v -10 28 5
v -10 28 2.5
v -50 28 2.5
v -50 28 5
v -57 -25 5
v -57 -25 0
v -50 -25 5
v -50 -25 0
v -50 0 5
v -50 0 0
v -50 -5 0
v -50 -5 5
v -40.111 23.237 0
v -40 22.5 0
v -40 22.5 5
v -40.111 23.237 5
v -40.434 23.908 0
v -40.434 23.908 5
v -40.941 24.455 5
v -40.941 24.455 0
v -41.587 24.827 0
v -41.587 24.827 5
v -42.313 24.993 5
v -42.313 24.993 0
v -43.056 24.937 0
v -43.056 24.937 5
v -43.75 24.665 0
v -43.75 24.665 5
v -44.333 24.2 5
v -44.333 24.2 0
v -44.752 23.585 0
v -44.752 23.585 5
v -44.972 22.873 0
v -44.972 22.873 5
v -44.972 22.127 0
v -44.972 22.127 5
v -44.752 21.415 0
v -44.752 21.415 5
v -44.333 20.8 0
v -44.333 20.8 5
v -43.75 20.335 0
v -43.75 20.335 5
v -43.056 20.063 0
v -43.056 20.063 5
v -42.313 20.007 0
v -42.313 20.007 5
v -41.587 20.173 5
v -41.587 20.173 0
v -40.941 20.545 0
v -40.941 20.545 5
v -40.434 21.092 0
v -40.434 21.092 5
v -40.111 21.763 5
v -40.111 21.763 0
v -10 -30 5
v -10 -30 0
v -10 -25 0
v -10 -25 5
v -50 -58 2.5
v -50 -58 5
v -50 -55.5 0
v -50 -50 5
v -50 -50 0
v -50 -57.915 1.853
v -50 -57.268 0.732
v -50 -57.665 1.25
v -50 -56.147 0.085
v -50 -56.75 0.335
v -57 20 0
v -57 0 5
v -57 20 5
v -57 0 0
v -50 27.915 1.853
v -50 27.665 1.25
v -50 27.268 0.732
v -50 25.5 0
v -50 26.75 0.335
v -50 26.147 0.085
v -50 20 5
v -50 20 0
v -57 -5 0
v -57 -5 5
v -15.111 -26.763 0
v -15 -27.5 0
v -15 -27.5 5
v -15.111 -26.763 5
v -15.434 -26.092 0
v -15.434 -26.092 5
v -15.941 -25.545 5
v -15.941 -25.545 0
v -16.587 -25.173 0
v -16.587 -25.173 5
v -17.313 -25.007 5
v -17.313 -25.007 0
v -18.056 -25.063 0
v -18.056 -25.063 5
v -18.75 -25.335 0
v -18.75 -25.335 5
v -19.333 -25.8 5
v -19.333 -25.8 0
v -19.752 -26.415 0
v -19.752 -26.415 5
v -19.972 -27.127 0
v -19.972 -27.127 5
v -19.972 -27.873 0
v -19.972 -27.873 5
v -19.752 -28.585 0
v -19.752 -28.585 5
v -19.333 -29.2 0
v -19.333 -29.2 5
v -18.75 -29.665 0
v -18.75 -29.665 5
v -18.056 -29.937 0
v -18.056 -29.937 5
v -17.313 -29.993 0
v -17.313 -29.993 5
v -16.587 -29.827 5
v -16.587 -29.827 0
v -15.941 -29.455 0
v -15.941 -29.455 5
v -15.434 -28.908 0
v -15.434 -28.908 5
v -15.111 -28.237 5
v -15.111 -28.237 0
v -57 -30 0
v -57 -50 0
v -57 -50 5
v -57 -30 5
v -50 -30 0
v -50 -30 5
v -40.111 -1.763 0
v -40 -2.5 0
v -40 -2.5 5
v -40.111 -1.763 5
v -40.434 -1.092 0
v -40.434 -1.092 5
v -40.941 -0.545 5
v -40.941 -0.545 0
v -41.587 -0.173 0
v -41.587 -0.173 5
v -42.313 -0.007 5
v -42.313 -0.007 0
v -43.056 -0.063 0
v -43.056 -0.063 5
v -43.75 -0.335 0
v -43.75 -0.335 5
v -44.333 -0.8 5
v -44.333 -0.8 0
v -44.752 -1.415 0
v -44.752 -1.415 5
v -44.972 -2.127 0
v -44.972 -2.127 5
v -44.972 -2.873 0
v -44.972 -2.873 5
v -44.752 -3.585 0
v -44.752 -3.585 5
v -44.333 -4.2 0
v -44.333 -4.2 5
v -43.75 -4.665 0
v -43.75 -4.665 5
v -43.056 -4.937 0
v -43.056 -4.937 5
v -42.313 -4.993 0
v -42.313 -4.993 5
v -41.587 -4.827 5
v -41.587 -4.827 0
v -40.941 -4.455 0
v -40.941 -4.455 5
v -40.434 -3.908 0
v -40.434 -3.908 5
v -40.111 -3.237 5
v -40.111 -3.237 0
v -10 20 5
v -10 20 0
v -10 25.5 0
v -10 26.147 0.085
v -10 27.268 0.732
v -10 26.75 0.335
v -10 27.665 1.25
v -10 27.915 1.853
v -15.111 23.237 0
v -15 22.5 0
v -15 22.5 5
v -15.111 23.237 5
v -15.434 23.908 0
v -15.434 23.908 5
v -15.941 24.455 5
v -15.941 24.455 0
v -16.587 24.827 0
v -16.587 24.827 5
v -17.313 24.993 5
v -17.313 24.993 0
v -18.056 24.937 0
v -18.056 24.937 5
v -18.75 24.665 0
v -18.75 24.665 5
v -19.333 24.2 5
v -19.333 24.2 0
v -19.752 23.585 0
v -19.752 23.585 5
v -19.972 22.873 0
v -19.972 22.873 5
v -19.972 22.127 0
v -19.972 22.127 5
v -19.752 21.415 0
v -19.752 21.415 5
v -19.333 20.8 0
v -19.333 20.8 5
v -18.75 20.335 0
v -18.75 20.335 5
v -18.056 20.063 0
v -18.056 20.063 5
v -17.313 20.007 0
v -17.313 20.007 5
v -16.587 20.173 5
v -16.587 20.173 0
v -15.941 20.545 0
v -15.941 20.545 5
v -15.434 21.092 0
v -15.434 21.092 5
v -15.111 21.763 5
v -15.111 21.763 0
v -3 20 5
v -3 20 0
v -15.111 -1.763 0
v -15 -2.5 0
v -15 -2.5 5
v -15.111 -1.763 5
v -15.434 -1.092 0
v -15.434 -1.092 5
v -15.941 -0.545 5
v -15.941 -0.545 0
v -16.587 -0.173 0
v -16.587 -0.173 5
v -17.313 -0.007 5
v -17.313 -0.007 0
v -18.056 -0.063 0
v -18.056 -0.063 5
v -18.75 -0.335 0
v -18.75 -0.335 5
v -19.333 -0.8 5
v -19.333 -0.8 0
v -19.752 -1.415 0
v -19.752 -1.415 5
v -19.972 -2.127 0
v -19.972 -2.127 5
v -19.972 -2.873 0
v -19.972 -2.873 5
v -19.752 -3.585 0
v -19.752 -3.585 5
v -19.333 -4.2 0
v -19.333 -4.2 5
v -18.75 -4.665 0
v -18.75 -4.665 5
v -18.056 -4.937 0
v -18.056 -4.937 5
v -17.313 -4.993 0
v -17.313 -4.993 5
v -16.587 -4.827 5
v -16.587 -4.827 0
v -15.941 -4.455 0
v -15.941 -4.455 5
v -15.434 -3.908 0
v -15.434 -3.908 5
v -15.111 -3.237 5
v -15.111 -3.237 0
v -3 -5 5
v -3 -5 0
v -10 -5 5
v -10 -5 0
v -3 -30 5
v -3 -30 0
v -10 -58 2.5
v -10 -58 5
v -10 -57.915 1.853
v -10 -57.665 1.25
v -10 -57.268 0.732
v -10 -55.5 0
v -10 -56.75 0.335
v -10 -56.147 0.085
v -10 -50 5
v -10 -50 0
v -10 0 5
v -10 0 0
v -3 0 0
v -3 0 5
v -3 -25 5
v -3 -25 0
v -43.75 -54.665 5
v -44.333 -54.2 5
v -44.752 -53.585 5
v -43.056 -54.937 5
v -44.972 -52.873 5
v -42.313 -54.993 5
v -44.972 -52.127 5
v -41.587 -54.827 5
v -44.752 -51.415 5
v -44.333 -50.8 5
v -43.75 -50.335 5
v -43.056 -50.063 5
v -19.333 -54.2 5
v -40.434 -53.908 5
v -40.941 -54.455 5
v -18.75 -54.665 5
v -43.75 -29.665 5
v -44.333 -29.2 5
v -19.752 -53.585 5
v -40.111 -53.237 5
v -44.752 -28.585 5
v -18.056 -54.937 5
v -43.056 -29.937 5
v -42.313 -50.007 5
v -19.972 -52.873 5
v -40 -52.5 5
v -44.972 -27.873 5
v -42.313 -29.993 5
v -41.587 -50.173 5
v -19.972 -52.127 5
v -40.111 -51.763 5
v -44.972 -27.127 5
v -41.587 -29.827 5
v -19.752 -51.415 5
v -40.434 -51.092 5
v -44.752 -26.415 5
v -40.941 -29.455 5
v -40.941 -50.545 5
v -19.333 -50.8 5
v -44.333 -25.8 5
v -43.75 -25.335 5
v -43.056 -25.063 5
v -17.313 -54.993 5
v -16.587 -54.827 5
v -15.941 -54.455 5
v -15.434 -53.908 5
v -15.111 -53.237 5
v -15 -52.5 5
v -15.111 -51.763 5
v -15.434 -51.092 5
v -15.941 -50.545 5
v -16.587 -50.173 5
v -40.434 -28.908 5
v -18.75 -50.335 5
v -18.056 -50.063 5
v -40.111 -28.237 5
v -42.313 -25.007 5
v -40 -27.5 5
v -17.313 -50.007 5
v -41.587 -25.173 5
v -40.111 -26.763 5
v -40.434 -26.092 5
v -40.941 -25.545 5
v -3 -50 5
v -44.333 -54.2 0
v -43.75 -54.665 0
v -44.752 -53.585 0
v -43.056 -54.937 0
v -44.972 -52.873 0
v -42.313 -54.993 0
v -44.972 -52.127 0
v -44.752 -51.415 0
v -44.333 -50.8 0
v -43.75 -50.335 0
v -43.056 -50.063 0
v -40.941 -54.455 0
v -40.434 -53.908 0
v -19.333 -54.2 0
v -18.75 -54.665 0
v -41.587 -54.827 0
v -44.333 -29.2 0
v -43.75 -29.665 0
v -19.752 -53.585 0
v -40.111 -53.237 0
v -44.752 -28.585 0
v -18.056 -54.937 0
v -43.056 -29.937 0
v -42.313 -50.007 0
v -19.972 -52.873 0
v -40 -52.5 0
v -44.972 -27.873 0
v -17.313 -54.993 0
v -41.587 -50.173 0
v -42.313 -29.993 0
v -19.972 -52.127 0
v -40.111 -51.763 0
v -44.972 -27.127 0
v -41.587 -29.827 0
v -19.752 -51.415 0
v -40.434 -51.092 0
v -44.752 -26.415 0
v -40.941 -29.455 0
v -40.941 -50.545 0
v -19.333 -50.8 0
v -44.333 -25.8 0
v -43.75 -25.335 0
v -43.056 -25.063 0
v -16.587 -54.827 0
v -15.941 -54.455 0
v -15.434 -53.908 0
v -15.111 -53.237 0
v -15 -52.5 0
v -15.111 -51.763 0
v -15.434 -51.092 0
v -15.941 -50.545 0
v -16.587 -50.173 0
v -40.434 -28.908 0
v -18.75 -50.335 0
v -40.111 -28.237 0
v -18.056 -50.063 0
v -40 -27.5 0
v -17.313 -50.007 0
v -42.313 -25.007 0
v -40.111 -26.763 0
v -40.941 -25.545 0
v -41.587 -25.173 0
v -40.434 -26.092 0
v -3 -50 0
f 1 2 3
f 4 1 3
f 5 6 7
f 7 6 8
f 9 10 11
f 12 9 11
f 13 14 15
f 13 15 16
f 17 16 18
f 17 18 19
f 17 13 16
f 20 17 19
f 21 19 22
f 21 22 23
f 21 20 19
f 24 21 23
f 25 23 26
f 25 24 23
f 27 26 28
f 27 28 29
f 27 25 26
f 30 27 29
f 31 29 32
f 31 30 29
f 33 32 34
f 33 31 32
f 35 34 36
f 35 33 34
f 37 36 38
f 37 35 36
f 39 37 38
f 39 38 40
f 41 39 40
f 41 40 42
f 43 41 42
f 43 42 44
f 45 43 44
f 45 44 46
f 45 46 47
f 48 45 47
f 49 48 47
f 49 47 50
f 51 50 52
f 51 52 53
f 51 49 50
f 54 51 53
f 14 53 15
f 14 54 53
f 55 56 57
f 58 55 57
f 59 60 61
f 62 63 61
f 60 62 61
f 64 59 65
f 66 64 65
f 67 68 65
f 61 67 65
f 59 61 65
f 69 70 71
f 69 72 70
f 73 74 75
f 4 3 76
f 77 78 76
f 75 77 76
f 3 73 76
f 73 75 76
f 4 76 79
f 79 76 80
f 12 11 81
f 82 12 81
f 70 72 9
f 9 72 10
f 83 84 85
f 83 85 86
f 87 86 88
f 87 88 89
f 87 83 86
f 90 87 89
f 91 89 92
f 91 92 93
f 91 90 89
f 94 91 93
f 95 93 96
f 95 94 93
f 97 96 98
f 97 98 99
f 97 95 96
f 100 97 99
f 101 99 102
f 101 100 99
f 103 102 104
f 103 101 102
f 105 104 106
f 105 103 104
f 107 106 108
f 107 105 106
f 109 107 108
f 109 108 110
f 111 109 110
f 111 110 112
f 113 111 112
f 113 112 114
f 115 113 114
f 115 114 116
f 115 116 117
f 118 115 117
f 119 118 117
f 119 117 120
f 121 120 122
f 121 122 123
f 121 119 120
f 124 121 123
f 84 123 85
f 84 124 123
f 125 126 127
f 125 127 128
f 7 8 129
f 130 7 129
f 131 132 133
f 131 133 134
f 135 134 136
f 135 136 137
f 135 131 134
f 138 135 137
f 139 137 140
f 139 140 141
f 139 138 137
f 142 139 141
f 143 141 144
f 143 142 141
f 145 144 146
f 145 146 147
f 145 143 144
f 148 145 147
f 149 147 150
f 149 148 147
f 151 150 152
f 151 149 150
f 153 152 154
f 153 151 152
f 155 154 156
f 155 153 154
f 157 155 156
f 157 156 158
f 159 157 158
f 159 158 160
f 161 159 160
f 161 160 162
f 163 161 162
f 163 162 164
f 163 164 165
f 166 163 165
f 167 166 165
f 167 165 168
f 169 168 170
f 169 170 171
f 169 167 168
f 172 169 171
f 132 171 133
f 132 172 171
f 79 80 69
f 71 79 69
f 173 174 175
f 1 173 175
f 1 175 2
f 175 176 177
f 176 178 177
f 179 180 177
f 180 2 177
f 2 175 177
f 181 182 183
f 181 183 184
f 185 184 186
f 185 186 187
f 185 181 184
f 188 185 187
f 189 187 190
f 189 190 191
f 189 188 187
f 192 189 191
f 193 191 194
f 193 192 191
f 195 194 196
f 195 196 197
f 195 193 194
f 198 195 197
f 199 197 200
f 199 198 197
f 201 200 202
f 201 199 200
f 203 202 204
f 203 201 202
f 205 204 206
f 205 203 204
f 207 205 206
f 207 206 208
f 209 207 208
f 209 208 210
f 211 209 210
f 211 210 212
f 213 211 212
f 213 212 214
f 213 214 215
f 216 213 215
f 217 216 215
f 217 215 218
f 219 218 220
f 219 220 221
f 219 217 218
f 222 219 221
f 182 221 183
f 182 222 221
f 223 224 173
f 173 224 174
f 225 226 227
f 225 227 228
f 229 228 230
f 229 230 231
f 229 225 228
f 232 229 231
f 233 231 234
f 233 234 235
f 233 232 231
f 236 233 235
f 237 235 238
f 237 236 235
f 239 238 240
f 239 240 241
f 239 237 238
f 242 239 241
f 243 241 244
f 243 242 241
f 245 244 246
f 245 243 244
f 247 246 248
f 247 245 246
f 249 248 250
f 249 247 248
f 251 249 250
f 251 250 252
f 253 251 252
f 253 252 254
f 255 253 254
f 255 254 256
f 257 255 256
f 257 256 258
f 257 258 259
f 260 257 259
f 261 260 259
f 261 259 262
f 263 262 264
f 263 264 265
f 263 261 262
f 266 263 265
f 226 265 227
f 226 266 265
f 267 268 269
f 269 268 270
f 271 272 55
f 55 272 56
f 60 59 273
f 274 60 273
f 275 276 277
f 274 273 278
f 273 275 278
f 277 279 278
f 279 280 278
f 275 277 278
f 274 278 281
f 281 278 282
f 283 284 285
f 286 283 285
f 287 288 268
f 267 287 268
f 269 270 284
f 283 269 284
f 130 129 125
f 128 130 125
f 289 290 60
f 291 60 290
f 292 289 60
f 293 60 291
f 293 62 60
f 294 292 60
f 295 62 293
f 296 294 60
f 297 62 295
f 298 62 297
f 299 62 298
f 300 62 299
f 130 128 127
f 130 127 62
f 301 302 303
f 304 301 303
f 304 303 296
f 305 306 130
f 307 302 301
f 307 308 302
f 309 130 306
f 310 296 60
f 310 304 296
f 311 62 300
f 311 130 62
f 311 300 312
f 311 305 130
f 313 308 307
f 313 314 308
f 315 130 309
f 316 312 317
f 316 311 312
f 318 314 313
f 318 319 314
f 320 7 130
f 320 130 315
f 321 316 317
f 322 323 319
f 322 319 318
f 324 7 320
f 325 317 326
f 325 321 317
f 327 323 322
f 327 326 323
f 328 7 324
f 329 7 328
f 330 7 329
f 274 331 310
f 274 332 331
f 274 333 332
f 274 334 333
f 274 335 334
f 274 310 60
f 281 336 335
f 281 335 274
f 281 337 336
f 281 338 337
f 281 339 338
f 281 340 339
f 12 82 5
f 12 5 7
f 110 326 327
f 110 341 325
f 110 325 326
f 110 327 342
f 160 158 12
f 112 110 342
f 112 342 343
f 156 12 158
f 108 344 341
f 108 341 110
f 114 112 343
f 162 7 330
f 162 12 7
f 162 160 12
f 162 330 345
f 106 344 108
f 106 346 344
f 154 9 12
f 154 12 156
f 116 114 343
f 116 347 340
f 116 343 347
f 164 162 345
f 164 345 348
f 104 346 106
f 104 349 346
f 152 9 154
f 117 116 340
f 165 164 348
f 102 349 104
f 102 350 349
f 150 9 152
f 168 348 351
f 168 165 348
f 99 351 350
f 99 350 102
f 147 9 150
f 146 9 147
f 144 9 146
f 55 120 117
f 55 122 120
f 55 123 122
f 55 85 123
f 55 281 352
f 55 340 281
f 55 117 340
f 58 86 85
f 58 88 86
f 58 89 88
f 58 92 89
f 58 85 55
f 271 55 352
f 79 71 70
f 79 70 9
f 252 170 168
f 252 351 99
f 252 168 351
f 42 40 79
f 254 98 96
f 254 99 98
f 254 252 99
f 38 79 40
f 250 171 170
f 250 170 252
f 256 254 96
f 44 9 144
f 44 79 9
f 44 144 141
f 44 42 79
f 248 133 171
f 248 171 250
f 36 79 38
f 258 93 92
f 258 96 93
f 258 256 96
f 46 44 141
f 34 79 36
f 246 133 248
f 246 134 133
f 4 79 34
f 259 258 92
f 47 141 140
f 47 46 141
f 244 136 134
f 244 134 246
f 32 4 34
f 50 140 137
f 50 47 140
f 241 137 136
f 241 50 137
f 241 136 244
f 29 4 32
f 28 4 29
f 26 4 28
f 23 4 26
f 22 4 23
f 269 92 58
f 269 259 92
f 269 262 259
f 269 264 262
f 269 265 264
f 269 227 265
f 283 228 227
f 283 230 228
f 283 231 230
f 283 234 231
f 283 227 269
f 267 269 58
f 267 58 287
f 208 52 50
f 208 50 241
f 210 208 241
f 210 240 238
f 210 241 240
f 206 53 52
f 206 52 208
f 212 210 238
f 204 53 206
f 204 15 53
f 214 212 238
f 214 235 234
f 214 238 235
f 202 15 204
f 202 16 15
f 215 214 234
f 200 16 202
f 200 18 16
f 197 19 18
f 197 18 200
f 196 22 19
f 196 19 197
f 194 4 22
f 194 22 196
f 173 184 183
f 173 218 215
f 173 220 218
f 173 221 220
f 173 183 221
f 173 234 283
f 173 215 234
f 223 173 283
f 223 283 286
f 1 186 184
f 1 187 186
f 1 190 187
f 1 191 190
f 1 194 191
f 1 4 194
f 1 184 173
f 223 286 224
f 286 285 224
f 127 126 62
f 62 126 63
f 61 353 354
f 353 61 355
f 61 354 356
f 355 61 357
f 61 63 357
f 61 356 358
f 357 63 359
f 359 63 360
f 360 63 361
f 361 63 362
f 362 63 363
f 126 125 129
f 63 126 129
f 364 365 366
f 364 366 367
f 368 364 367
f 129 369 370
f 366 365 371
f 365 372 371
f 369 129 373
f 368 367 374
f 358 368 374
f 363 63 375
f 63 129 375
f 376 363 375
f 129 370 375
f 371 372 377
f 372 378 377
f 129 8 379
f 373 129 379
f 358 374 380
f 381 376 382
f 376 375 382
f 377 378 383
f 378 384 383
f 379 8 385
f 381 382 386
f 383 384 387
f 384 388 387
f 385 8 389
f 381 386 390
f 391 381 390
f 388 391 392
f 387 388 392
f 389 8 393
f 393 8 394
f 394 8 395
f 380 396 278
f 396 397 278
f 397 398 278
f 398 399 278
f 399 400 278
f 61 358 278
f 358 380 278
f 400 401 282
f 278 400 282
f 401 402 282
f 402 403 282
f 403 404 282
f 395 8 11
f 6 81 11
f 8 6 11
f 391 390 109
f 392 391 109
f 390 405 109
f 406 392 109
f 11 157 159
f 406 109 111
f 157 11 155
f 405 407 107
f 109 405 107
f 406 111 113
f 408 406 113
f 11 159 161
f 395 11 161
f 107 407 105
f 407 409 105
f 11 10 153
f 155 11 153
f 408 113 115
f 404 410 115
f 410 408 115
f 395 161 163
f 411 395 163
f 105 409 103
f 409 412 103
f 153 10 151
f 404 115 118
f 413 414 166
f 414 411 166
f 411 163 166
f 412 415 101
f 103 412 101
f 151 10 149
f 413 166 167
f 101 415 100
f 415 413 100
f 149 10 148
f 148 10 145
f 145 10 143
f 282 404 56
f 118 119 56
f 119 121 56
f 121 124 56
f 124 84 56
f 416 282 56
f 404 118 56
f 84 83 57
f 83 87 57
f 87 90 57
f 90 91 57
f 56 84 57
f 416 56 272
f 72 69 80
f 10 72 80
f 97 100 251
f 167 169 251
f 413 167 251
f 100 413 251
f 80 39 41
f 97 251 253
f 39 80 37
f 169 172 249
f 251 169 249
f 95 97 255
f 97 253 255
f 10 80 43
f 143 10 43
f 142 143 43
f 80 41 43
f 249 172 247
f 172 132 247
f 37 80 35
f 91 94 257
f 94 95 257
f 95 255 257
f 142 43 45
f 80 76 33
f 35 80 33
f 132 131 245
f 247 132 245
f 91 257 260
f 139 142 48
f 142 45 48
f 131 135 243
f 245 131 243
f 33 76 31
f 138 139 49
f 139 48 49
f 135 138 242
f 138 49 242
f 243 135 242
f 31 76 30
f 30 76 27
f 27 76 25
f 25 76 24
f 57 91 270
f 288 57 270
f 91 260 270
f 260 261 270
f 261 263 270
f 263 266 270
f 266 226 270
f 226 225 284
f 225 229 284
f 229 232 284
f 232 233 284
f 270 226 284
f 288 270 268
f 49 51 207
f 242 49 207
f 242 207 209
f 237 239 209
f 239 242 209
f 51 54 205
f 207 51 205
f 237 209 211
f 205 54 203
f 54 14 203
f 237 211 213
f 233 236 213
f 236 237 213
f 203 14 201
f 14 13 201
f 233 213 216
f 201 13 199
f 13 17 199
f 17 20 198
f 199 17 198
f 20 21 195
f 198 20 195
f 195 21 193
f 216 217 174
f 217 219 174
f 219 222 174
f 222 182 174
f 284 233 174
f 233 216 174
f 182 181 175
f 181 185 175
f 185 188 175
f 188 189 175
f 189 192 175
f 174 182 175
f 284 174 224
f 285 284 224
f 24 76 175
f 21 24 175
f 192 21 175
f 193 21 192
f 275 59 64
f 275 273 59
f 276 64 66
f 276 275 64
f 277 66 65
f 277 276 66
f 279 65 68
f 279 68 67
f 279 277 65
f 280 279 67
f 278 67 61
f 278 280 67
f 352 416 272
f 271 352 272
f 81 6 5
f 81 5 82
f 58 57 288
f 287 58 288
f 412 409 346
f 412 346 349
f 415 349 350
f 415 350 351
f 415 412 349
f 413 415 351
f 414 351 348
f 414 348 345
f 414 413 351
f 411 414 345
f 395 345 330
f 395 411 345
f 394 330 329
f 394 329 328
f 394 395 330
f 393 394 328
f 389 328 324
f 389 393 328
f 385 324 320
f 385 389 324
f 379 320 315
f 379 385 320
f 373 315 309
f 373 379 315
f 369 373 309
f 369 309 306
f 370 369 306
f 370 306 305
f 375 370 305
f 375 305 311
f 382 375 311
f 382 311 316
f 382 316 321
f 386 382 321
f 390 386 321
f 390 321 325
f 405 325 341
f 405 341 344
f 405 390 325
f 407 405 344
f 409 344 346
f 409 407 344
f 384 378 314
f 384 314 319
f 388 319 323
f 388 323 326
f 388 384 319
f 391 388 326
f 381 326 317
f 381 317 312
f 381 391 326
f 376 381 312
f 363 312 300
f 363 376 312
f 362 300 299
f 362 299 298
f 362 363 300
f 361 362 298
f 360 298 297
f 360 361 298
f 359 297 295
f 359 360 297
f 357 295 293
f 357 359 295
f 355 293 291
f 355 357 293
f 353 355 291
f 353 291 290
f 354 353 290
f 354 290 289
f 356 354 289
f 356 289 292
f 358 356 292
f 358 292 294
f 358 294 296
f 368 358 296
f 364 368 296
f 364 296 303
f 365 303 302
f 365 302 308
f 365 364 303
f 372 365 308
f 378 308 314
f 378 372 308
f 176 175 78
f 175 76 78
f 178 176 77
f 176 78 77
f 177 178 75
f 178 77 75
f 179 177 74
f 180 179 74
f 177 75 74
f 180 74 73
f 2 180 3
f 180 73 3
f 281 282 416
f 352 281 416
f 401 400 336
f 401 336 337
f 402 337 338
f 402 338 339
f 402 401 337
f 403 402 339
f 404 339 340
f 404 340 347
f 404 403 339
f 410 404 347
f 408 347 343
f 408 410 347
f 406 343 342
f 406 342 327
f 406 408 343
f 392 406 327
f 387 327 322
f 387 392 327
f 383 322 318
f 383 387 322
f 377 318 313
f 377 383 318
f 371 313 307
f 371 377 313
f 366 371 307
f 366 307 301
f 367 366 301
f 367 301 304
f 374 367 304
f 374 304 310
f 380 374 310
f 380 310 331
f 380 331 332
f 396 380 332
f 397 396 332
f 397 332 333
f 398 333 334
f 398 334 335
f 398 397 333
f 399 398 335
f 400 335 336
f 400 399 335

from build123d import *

# Parameters (mm, degrees)
SKETCH1_R           = 2.5
BOSS_EXTRUDE1_DEPTH = 5
FILLET1_R           = 2.5
FILLET2_R           = 2.5
SKETCH2_W           = 3
SKETCH2_H           = 70
CUT_EXTRUDE3_DEPTH  = 10


with BuildPart() as part:
    # Sketch1 → Boss-Extrude1 (new body)
    with BuildSketch(Plane.XY):
        Polygon((-50, 20), (-60, 20), (-60, 0), (-50, 0), (-50, -5), (-60, -5), (-60, -25), (-50, -25), (-50, -30), (-60, -30), (-60, -50), (-50, -50), (-50, -58), (-10, -58), (-10, -50), (0, -50), (0, -30), (-10, -30), (-10, -25), (0, -25), (0, -5), (-10, -5), (-10, 0), (0, 0), (0, 20), (-10, 20), (-10, 28), (-50, 28), align=None)
        with Locations((-42.5, 22.5)):
            Circle(SKETCH1_R, mode=Mode.SUBTRACT)
        with Locations((-17.5, 22.5)):
            Circle(SKETCH1_R, mode=Mode.SUBTRACT)
        with Locations((-42.5, -2.5)):
            Circle(SKETCH1_R, mode=Mode.SUBTRACT)
        with Locations((-17.5, -2.5)):
            Circle(SKETCH1_R, mode=Mode.SUBTRACT)
        with Locations((-17.5, -27.5)):
            Circle(SKETCH1_R, mode=Mode.SUBTRACT)
        with Locations((-42.5, -27.5)):
            Circle(SKETCH1_R, mode=Mode.SUBTRACT)
        with Locations((-17.5, -52.5)):
            Circle(SKETCH1_R, mode=Mode.SUBTRACT)
        with Locations((-42.5, -52.5)):
            Circle(SKETCH1_R, mode=Mode.SUBTRACT)
    extrude(amount=BOSS_EXTRUDE1_DEPTH)

    # Fillet1
    fillet1_edges = [part.edges().sort_by_distance(p)[0] for p in [
        (-30, -58, 0),
    ]]
    fillet(fillet1_edges, radius=FILLET1_R)

    # Fillet2
    fillet2_edges = [part.edges().sort_by_distance(p)[0] for p in [
        (-30, 28, 0),
    ]]
    fillet(fillet2_edges, radius=FILLET2_R)

    # Sketch2 → Cut-Extrude3 (cut)
    with BuildSketch(Plane(origin=(0, 0, 0), x_dir=(-1, 0, 0), z_dir=(0, 0, -1))):
        with Locations((58.5, -15)):
            Rectangle(SKETCH2_W, SKETCH2_H)
        with Locations((1.5, -15)):
            Rectangle(SKETCH2_W, SKETCH2_H)
    extrude(amount=-CUT_EXTRUDE3_DEPTH, mode=Mode.SUBTRACT)


solid = part.part
